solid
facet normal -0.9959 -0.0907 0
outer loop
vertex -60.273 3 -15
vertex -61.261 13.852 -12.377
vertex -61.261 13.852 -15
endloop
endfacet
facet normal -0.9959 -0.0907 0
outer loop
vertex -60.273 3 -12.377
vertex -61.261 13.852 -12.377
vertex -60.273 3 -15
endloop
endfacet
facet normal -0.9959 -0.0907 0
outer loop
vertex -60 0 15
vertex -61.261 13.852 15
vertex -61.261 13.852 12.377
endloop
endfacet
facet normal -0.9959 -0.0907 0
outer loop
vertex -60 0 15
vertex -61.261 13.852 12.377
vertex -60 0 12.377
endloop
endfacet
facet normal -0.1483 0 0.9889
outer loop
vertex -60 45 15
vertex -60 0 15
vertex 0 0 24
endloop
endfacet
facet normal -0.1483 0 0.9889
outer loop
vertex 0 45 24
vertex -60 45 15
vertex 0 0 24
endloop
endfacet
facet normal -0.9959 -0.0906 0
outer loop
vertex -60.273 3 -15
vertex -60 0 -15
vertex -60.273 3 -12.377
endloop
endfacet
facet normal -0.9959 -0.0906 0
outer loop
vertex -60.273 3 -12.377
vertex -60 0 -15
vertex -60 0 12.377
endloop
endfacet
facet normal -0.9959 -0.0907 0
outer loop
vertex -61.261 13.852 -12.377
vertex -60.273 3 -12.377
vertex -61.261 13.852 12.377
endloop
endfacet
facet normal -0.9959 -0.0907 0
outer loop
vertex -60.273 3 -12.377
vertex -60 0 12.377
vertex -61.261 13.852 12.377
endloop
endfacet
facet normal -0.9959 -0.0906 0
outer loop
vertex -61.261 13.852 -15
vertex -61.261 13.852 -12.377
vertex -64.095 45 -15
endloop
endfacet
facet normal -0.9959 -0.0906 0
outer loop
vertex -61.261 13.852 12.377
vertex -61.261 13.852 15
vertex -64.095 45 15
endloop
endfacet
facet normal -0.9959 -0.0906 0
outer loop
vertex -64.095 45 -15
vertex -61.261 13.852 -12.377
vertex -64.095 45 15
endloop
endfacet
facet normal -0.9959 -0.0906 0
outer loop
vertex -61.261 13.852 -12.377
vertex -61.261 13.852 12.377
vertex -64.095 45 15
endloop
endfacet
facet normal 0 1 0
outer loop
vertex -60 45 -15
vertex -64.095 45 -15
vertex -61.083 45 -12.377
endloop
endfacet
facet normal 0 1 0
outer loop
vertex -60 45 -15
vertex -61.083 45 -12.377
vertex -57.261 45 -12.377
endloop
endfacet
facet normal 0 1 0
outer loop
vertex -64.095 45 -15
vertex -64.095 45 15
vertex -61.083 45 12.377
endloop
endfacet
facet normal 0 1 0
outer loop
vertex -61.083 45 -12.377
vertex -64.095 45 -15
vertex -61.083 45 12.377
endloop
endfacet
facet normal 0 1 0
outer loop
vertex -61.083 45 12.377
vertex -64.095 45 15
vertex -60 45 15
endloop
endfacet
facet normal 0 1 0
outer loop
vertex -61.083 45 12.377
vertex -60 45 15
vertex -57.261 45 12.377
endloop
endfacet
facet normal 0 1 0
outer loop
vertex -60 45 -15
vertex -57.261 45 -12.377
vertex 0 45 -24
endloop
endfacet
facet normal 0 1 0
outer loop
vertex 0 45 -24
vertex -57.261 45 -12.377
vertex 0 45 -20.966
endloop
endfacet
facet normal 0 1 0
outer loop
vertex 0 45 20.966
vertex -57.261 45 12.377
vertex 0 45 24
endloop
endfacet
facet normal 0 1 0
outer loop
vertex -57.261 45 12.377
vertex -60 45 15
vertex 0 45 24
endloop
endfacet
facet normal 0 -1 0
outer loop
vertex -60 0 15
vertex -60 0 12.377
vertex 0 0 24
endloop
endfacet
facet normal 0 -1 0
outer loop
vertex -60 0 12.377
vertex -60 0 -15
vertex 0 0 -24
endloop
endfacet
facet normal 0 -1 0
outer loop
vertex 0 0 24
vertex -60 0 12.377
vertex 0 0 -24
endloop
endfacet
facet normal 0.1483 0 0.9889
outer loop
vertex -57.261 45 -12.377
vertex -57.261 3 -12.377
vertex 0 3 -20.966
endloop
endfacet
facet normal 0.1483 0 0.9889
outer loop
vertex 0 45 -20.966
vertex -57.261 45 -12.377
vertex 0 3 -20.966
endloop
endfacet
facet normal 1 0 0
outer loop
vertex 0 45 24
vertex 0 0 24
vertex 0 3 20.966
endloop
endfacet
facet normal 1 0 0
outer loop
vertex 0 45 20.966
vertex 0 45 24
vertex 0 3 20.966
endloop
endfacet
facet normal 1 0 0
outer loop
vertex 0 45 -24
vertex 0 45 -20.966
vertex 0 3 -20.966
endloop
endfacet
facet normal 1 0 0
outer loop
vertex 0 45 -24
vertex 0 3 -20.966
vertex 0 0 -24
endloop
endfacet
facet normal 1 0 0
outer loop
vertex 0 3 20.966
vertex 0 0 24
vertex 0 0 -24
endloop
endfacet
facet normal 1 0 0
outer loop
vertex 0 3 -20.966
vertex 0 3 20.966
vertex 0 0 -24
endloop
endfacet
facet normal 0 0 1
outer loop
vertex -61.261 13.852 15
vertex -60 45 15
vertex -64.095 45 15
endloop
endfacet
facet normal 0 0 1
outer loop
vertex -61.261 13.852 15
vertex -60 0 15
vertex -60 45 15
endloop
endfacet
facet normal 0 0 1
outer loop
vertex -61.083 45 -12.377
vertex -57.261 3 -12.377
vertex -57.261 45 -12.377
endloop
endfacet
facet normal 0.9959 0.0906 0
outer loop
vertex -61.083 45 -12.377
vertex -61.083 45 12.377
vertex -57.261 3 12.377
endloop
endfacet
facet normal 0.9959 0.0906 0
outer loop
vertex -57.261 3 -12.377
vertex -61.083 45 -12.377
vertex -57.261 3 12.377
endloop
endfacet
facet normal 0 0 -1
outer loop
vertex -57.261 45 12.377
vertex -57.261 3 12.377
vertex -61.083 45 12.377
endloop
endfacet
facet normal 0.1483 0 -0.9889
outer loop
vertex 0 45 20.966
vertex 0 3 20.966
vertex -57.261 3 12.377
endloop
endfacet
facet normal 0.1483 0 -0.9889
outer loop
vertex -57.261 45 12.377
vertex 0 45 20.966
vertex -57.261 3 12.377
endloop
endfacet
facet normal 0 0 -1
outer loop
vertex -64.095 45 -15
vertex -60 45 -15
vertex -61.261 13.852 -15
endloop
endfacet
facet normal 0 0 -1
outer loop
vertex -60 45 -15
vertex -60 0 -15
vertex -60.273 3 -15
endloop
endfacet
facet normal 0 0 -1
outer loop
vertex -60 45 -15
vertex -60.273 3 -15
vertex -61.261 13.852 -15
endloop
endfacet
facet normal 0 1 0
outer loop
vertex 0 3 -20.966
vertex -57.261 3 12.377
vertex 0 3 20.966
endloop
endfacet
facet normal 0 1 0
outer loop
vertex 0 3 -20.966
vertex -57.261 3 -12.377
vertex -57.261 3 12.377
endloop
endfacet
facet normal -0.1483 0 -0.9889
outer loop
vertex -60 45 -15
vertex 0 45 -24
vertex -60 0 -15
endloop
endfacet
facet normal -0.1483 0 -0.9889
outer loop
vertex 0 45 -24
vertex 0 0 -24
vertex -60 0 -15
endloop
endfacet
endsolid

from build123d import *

# Parameters (mm, degrees)
BOSS_EXTRUDE1_DEPTH = 3
BOSS_EXTRUDE2_DEPTH = 15
BOSS_EXTRUDE3_DEPTH = 42
SKETCH6_W           = 2.622655796
SKETCH6_H           = 42
SKETCH6_H_2         = 45
BOSS_EXTRUDE4_DEPTH = 4
CUT_EXTRUDE1_DEPTH  = 88.488342941


with BuildPart() as part:
    # Sketch1 → Boss-Extrude1 (new body)
    with BuildSketch(Plane(origin=(0, 0, 0), x_dir=(1, 0, 0), z_dir=(0, 1, 0))):
        Polygon((-60, 0), (0, 0), (0, 24), (-60, 15), align=None)
        Polygon((-60, -15), (0, -24), (0, 0), (-60, 0), align=None)
    extrude(amount=BOSS_EXTRUDE1_DEPTH)

    # Sketch3 → Boss-Extrude2 (add, symmetric)
    with BuildSketch(Plane.XY):
        Polygon((-64.095320817, 45), (-61.082922988, 45), (-56.987602171, 0), (-60, 0), align=None)
    extrude(amount=BOSS_EXTRUDE2_DEPTH, both=True)

    # Sketch4 → Boss-Extrude3 (add)
    with BuildSketch(Plane(origin=(0, 3, 0), x_dir=(1, 0, 0), z_dir=(0, 1, 0))):
        Polygon((-57.260623559, 12.377344204), (0, 20.966437738), (0, 24), (-60, 15), (-57.260623559, 15), align=None)
        Polygon((0, -24), (0, -20.966437738), (-57.260623559, -12.377344204), (-57.260623559, -15), (-60, -15), align=None)
    extrude(amount=BOSS_EXTRUDE3_DEPTH)

    # Sketch6 → Boss-Extrude4 (add)
    with BuildSketch(Plane.ZY.offset(57.260623559)):
        with Locations((-13.688672102, 24)):
            Rectangle(SKETCH6_W, SKETCH6_H)
        with Locations((13.688672102, 22.5)):
            Rectangle(SKETCH6_W, SKETCH6_H_2)
    extrude(amount=BOSS_EXTRUDE4_DEPTH)

    # Sketch7 → Cut-Extrude1 (cut, through all)
    with BuildSketch(Plane.XY.offset(15)):
        Polygon((-61.260623559, 13.851920935), (-60, 0), (-61.260623559, 0), align=None)
    extrude(amount=-CUT_EXTRUDE1_DEPTH, mode=Mode.SUBTRACT)


solid = part.part
